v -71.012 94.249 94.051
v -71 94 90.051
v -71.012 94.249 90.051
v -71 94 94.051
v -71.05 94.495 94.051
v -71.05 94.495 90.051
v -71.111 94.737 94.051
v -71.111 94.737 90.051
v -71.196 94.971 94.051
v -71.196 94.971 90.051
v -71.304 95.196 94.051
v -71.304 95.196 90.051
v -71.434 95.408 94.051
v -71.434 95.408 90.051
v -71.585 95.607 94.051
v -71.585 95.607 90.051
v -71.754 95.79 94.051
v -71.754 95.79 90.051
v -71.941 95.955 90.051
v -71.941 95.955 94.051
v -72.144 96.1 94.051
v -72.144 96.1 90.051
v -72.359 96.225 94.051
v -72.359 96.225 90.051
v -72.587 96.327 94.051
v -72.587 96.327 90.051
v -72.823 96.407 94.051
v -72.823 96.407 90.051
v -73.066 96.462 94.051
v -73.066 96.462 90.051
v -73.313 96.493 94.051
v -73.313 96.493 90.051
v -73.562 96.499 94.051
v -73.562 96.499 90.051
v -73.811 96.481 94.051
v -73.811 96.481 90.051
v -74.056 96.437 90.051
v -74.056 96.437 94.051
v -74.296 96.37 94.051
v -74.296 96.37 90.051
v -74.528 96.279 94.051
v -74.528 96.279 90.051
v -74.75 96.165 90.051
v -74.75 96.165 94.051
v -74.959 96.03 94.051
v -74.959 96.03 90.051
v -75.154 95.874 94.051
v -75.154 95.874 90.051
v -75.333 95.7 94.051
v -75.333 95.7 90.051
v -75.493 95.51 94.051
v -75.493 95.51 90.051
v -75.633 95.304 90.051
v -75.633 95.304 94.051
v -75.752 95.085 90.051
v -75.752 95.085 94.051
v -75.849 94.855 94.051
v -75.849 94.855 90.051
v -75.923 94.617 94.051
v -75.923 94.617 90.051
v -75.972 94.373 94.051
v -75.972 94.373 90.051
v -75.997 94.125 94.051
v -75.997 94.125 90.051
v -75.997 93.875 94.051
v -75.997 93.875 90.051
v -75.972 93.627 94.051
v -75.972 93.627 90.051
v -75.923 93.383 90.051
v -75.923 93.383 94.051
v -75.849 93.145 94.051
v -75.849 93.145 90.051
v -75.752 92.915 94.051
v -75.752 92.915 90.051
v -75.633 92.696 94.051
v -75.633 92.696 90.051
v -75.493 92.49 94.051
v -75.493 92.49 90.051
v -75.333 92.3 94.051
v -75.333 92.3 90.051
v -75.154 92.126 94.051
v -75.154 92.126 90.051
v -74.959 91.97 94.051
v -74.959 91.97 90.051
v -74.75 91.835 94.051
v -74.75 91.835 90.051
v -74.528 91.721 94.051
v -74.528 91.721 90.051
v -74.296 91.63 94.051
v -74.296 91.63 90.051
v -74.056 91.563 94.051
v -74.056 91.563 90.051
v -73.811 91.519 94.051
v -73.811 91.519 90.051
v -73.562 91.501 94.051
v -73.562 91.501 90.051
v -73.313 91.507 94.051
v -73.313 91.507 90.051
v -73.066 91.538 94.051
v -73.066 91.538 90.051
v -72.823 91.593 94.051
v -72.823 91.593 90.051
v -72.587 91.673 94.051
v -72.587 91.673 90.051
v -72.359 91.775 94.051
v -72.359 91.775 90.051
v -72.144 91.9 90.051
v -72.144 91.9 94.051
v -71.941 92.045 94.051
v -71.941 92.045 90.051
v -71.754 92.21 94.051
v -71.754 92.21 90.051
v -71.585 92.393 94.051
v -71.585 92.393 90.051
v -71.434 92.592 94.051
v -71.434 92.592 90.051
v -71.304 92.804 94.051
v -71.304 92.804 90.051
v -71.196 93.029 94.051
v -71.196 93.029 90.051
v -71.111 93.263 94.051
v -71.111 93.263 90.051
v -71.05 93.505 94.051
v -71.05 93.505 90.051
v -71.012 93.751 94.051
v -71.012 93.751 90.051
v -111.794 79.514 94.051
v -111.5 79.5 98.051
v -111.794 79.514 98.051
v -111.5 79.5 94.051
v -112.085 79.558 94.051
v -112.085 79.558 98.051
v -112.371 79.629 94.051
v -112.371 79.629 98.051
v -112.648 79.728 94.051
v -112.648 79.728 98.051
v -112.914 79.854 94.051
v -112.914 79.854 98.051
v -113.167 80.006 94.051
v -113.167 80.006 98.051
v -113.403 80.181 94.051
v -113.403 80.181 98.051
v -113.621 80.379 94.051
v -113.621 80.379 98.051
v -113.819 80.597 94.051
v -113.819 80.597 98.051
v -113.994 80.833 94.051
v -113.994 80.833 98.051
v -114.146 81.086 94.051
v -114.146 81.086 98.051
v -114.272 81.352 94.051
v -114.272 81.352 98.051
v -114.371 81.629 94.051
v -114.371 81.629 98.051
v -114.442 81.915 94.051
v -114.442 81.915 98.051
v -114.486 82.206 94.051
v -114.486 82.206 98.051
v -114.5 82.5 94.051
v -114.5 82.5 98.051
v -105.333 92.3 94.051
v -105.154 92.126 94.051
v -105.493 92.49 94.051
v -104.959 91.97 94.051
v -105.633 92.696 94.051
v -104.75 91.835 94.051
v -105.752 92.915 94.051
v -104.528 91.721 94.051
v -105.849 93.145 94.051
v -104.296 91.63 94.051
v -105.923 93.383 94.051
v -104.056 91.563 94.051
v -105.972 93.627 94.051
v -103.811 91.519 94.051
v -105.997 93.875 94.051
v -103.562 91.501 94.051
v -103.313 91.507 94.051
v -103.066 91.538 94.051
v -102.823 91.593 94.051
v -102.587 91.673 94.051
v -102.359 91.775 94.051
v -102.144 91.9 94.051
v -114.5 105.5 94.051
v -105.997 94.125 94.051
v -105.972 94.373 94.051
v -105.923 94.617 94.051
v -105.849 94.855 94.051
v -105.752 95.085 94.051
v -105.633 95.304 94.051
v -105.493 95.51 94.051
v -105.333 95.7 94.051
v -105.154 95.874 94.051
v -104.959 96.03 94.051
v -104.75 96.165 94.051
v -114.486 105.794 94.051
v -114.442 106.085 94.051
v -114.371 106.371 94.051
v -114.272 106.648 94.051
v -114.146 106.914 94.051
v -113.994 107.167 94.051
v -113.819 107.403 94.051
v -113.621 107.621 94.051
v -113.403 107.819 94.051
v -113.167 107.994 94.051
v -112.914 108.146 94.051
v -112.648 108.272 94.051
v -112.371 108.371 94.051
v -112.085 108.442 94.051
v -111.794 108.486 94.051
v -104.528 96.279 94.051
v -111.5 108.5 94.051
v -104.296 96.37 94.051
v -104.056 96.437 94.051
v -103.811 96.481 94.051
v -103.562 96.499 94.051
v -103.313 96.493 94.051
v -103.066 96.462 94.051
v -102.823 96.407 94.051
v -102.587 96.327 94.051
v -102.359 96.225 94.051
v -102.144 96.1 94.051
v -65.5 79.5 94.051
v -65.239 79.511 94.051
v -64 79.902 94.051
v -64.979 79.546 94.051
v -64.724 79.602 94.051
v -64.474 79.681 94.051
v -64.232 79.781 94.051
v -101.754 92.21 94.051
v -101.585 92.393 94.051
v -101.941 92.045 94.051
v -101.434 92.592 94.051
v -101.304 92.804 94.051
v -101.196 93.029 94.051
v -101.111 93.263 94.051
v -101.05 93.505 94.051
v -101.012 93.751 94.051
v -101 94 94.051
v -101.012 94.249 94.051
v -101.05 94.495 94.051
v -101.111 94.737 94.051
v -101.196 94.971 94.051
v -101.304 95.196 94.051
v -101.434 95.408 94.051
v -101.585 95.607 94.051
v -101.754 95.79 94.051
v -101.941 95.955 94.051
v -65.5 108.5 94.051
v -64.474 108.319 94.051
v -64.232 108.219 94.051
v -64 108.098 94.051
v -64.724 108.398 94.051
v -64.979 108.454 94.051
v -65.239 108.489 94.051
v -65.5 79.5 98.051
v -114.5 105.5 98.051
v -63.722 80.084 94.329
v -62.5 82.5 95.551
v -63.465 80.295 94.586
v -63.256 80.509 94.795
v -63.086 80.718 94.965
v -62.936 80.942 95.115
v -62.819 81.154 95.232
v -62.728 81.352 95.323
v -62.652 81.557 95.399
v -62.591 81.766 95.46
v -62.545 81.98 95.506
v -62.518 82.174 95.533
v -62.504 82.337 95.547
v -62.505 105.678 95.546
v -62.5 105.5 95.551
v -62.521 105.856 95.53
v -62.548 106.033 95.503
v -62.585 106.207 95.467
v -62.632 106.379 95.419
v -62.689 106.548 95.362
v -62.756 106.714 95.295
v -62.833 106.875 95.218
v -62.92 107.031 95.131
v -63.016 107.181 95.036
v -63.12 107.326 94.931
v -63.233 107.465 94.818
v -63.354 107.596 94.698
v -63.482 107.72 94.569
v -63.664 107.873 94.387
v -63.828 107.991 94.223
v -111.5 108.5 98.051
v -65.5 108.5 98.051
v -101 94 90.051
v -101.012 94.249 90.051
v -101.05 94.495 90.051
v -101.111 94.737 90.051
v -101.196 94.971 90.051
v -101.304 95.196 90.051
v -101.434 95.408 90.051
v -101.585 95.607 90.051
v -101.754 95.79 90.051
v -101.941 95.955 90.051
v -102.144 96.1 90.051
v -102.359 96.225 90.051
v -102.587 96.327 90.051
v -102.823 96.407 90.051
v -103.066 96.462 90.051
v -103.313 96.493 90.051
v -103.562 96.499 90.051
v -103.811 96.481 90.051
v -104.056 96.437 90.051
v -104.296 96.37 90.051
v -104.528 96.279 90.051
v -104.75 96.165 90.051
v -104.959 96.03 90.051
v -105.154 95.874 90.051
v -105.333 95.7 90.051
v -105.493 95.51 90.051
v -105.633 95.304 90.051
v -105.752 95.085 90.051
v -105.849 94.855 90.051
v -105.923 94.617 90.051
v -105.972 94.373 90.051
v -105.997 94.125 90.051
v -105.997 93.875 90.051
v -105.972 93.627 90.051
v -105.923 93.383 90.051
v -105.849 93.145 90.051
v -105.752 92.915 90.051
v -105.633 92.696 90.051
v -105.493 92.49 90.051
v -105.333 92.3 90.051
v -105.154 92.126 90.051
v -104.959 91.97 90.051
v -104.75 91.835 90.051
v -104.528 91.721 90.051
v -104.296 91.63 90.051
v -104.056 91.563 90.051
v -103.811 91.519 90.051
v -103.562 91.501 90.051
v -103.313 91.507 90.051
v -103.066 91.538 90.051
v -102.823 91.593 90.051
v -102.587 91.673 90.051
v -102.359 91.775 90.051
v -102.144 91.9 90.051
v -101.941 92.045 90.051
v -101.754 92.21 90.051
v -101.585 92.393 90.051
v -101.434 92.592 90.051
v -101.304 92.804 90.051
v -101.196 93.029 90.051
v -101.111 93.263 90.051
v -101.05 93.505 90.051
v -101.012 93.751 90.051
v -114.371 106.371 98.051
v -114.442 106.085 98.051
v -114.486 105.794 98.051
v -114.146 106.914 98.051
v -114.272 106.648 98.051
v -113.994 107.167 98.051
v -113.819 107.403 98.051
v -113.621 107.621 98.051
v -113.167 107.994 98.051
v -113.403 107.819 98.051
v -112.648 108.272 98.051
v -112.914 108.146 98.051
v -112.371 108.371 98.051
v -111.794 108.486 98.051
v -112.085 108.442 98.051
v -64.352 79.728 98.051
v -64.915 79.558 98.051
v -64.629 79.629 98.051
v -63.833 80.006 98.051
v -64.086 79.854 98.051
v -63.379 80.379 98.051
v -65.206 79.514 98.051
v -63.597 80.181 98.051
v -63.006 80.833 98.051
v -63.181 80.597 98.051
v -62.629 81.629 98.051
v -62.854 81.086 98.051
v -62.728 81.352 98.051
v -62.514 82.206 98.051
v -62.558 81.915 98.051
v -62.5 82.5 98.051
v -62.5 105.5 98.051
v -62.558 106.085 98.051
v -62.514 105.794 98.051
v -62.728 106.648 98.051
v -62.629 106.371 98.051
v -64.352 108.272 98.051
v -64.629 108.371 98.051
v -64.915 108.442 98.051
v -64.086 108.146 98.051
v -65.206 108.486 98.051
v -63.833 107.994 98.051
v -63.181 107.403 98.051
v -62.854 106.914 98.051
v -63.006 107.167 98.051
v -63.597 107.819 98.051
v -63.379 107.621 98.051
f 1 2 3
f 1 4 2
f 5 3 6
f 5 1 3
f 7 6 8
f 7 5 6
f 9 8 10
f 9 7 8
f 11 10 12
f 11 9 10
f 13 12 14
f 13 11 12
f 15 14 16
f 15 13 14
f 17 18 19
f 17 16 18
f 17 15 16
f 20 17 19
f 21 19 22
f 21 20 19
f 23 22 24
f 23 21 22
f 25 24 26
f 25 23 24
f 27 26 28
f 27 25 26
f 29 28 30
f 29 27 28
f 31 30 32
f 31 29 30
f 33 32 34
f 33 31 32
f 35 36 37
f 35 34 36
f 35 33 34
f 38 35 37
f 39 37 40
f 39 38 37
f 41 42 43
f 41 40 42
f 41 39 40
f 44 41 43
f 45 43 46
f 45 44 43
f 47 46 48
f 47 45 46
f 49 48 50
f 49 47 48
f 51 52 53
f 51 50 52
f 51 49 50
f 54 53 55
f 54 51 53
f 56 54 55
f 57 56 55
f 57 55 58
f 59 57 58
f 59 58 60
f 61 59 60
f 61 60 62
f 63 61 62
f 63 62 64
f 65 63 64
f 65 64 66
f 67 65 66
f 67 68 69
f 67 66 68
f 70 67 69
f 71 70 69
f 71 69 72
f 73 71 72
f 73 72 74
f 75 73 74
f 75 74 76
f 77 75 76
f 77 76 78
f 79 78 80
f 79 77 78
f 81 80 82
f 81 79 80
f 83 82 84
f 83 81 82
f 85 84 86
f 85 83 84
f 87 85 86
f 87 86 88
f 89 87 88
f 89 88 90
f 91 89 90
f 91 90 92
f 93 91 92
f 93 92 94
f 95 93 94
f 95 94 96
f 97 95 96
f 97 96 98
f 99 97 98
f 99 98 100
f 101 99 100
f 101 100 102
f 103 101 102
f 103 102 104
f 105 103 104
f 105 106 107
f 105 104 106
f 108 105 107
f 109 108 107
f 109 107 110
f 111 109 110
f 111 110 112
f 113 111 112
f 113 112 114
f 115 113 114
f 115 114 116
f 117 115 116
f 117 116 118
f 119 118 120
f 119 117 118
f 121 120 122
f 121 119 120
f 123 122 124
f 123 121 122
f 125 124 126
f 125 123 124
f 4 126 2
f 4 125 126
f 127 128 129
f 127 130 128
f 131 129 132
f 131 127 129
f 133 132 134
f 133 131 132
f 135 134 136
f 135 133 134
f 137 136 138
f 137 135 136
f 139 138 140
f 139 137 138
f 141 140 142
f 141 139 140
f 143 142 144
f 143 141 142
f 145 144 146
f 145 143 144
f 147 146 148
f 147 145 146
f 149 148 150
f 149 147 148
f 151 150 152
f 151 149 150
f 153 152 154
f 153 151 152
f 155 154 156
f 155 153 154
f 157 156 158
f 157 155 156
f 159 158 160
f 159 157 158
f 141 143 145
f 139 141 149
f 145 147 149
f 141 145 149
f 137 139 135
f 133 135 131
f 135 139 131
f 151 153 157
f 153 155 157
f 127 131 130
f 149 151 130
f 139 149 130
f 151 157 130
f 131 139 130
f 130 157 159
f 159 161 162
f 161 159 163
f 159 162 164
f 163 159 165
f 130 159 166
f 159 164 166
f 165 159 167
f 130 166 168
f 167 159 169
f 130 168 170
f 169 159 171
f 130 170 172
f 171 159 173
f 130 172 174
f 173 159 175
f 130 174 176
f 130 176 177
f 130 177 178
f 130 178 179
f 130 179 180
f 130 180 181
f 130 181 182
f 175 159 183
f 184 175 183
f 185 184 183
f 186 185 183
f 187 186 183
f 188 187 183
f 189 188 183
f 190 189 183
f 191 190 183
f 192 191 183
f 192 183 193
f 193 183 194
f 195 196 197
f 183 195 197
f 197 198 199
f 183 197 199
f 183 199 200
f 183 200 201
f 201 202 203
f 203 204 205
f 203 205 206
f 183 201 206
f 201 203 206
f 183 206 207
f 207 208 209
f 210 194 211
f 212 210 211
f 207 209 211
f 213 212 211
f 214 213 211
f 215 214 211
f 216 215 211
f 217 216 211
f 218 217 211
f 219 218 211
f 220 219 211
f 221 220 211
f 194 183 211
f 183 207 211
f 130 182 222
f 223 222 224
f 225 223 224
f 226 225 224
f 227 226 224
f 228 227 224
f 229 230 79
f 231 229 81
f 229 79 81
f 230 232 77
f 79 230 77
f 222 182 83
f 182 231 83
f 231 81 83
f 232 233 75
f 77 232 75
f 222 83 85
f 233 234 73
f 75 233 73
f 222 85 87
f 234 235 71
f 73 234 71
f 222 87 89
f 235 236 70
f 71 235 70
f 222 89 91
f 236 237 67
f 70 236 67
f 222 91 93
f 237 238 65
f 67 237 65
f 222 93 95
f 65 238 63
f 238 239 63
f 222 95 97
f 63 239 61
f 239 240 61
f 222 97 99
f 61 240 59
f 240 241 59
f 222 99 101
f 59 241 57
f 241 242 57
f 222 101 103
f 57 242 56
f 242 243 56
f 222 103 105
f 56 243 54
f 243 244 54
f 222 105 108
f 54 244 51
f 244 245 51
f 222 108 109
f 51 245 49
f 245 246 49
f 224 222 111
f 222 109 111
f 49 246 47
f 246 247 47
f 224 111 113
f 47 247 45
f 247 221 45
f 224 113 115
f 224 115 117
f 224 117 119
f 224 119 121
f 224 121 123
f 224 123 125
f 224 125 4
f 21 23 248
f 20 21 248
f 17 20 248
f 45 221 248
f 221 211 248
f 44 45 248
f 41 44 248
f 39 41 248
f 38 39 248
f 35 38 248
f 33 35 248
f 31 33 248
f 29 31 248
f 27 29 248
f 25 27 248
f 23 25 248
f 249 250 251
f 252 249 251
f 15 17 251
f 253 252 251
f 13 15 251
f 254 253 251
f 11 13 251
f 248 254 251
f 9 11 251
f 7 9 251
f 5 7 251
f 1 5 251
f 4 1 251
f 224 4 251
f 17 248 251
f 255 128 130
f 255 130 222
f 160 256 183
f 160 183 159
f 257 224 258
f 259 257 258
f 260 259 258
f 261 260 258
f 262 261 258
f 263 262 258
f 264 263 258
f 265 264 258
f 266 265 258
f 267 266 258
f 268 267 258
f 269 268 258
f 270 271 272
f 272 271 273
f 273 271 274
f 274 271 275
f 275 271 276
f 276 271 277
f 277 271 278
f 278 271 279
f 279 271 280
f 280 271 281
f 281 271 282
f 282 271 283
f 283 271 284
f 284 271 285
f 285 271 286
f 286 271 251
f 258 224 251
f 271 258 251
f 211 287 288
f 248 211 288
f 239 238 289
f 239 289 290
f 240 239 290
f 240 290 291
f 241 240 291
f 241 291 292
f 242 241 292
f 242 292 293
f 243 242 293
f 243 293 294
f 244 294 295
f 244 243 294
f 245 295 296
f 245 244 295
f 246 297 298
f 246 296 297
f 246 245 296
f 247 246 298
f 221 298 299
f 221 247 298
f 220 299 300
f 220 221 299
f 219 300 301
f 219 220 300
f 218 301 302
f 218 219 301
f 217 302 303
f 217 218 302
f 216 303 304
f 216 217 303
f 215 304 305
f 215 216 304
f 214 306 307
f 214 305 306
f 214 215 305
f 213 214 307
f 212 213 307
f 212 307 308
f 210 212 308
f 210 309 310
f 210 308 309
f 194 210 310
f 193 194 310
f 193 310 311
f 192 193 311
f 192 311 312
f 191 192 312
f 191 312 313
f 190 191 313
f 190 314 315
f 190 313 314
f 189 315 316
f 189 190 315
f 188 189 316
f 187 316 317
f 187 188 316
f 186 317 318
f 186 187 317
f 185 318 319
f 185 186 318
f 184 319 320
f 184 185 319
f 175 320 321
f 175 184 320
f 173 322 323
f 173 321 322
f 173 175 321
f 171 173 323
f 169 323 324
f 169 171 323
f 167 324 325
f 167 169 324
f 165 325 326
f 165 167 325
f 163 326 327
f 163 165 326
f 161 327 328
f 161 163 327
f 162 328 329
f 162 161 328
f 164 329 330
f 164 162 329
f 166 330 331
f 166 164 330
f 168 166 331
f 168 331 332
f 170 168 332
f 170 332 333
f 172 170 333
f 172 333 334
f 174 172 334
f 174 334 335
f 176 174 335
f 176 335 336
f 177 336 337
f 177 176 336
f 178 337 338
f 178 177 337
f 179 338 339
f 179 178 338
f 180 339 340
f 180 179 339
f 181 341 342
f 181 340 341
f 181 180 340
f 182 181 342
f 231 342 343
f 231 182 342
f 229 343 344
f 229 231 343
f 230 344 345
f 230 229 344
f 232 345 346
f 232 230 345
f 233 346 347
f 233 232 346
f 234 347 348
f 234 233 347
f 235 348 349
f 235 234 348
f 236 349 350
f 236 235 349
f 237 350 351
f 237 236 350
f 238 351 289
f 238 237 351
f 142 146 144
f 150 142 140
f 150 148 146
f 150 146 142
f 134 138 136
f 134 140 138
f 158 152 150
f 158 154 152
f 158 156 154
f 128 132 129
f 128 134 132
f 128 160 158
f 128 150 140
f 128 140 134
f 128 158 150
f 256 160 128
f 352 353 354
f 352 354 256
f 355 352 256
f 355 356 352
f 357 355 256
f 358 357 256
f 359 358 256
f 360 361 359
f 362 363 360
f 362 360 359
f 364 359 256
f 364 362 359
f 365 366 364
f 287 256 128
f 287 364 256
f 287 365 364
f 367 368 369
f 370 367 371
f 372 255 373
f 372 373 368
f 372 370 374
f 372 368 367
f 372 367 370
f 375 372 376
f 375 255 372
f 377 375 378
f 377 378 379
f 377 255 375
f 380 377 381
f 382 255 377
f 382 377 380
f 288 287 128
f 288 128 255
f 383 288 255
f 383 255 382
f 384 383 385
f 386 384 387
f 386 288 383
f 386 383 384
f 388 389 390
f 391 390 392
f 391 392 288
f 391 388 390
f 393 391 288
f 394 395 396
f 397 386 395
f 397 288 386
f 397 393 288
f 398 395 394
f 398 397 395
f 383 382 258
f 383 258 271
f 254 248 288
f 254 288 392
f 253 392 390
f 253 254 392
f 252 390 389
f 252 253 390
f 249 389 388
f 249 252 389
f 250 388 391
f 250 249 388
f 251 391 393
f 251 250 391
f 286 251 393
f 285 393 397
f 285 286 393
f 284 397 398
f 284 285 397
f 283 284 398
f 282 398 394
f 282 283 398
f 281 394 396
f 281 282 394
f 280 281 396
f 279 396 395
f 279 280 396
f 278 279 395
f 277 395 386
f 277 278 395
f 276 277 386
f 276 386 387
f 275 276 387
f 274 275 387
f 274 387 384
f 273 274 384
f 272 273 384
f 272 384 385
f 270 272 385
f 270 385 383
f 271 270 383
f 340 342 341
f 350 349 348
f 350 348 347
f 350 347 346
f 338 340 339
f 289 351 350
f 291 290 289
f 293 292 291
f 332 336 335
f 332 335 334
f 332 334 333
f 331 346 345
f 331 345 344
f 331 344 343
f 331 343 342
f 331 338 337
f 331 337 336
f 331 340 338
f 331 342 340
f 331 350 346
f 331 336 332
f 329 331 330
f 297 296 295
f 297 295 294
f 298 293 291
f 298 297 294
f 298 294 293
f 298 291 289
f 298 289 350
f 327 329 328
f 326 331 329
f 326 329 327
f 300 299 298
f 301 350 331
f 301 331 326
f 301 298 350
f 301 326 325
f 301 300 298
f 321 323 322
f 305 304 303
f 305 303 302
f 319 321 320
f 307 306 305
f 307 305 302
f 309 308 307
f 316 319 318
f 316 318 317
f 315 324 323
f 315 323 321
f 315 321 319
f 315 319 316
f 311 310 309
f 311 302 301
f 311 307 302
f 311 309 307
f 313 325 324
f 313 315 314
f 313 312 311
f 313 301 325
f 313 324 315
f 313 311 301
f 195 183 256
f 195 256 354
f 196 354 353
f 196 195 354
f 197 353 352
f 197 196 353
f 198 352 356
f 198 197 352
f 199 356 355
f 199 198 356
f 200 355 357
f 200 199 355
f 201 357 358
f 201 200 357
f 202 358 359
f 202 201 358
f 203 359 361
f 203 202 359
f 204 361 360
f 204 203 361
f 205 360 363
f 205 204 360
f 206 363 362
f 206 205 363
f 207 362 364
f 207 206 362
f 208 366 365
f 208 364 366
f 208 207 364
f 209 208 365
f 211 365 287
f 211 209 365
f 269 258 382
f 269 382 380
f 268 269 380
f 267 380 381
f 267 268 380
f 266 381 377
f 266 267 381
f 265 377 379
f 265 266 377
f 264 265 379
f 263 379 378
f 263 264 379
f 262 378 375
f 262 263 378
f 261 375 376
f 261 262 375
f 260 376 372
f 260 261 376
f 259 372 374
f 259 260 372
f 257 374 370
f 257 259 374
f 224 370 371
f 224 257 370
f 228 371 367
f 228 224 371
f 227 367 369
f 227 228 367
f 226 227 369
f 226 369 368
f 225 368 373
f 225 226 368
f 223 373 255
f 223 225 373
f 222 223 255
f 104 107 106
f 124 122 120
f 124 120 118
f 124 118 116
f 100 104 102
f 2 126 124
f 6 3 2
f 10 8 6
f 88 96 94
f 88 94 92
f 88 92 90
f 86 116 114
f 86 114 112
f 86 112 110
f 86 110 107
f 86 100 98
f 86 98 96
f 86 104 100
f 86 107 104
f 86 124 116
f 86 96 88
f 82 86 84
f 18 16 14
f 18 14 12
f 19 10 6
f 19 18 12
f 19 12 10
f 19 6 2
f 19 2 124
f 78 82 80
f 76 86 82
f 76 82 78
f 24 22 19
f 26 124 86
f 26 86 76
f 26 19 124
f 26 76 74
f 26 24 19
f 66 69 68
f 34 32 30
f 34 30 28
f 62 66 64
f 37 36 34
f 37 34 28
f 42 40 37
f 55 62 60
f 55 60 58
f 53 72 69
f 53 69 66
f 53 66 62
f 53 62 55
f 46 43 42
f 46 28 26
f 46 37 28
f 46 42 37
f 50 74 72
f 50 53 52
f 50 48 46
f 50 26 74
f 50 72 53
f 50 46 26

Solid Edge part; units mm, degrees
sketch "Sketch1" plane through (0, 0, 98.0511) normal (0, 0, 1) x (1, 0, 0)
  line L0 (-114.5, 79.5) -> (-62.5, 79.5)
  line L1 (-62.5, 79.5) -> (-62.5, 108.5)
  line L2 (-114.5, 108.5) -> (-62.5, 108.5)
  line L3 (-114.5, 108.5) -> (-114.5, 79.5)
extrude "Protrusion1" add sketch "Sketch1" against normal blind 4
fillet "Round_3" radius 3 2 edges at (-114.5, 79.5, 96.0511) (-114.5, 108.5, 96.0511)
chamfer "Chamfer_2" distance 1.5 angle 45 1 edges at (-62.5, 94, 94.0511)
fillet "Round_4" radius 3 2 edges at (-62.5, 79.5, 96.8011) (-62.5, 108.5, 96.8011)
sketch "Sketch2" plane through (-89.25, 94, 94.0511) normal (0, 0, -1) x (1, 0, 0)
  circle A0 centre (-14.25, 0) radius 2.5
  circle A1 centre (15.75, 0) radius 2.5
extrude "ExtrudedProtrusion_8" add sketch "Sketch2" along normal blind 4
